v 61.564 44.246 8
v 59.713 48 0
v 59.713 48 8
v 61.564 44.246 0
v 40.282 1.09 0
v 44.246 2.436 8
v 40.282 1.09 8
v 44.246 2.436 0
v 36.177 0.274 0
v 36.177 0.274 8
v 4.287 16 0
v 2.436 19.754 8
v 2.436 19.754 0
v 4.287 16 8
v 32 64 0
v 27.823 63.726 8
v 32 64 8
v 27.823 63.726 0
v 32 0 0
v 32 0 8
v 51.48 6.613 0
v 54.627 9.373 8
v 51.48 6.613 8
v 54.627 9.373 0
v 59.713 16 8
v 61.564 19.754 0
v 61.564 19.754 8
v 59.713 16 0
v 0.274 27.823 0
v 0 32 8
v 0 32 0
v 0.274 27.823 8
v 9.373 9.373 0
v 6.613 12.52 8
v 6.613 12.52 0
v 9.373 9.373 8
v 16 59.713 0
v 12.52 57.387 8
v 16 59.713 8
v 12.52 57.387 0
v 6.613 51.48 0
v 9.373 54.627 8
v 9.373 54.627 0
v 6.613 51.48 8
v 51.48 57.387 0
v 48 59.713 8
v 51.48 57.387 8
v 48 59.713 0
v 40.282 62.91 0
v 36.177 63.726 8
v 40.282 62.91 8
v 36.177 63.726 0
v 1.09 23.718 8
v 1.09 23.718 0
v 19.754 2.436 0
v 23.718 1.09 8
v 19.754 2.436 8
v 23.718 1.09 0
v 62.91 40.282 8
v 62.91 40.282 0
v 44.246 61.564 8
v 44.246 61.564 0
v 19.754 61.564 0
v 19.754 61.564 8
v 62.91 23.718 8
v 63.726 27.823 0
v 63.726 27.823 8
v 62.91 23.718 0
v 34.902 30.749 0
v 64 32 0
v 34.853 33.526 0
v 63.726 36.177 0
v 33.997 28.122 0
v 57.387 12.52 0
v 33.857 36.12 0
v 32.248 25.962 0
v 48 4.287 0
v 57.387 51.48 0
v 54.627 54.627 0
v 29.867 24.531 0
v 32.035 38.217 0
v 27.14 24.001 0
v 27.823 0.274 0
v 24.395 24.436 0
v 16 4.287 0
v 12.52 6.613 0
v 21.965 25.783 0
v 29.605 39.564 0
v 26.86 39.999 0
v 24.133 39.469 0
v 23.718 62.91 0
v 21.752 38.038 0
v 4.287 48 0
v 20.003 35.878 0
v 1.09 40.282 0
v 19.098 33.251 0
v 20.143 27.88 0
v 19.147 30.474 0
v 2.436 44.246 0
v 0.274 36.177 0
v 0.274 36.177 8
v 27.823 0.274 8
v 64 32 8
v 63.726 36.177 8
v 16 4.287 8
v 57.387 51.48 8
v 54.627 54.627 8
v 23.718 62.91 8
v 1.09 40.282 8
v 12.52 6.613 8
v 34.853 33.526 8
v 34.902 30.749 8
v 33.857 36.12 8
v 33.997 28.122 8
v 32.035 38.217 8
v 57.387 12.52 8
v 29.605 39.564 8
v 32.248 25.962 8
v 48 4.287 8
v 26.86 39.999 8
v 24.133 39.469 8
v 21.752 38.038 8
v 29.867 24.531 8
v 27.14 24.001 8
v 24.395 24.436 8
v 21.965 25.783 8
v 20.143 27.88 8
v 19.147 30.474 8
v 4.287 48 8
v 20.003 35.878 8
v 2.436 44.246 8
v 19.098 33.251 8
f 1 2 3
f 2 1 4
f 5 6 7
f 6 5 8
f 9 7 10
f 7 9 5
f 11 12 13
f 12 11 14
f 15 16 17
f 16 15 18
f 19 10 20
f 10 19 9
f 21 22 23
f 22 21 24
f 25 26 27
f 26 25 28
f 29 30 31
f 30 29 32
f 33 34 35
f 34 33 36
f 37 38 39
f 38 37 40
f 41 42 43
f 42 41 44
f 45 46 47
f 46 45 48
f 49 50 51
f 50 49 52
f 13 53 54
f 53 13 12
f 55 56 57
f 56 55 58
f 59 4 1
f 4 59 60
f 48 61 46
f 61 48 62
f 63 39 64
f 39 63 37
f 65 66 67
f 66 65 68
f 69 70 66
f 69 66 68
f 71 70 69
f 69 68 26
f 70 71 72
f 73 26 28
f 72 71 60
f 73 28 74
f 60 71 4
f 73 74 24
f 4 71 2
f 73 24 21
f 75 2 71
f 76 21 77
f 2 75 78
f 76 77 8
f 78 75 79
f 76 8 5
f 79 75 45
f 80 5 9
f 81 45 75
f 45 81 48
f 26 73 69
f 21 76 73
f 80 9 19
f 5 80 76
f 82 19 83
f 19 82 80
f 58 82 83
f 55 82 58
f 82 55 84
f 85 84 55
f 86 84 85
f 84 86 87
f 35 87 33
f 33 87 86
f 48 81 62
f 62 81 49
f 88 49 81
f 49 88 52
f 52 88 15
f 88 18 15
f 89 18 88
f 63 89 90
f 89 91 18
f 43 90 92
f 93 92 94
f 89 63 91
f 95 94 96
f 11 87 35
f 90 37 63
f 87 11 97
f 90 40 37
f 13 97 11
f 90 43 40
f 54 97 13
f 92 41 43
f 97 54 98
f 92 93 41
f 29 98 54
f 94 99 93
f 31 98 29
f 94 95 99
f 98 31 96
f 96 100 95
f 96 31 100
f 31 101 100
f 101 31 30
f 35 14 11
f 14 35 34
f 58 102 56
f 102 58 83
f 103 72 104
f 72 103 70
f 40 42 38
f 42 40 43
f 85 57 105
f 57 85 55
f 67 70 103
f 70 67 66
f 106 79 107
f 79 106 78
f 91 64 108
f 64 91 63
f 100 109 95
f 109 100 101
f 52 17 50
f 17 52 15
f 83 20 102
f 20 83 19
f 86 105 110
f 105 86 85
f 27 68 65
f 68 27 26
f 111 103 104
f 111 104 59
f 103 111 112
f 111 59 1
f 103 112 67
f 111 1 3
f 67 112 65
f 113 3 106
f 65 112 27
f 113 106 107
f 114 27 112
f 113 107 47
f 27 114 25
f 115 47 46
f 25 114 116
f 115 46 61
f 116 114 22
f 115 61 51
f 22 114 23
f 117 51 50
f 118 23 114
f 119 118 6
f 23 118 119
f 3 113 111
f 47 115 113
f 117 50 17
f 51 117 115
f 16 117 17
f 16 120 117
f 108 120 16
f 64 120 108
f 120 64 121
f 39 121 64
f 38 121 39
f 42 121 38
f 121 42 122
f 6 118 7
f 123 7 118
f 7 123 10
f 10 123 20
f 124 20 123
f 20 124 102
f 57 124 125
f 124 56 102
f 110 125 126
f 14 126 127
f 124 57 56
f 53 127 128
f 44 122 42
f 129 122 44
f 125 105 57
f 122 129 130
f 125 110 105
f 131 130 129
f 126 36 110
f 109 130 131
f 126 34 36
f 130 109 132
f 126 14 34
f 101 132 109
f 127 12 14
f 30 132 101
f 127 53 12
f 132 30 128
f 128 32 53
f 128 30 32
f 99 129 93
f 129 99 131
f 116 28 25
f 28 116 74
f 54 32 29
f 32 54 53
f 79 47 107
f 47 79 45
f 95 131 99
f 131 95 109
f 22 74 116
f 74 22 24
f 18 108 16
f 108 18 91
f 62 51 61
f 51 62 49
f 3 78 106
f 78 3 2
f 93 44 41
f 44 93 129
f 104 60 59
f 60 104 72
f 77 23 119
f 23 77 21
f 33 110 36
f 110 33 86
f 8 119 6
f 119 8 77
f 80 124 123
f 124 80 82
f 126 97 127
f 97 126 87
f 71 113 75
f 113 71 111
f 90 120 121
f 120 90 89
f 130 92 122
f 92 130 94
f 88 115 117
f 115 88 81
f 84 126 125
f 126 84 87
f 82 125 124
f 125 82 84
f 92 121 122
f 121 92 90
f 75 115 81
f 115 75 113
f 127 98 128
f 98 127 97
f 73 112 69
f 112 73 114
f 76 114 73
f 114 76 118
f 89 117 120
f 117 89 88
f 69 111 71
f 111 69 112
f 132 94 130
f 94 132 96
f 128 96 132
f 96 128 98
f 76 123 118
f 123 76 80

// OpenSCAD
$fn = 32;

// ----------------------------------------------------------------------
// Cam plate: eccentric cam, base R32
// ----------------------------------------------------------------------

// --- parameters (mm) ---
base_r = 32;              // base circle radius
lobe_h = 8;               // cam lobe rise
bore_r = 8;               // shaft bore radius
plate_t = 8;              // plate thickness, Z (extrusion height)
ecc = 5;                  // disc eccentricity

profile = [[64, 32], [63.726, 36.177], [62.91, 40.282], [61.564, 44.246], [59.713, 48], [57.387, 51.48], [54.627, 54.627], [51.48, 57.387], [48, 59.713], [44.246, 61.564], [40.282, 62.91], [36.177, 63.726], [32, 64], [27.823, 63.726], [23.718, 62.91], [19.754, 61.564], [16, 59.713], [12.52, 57.387], [9.373, 54.627], [6.613, 51.48], [4.287, 48], [2.436, 44.246], [1.09, 40.282], [0.274, 36.177], [0, 32], [0.274, 27.823], [1.09, 23.718], [2.436, 19.754], [4.287, 16], [6.613, 12.52], [9.373, 9.373], [12.52, 6.613], [16, 4.287], [19.754, 2.436], [23.718, 1.09], [27.823, 0.274], [32, 0], [36.177, 0.274], [40.282, 1.09], [44.246, 2.436], [48, 4.287], [51.48, 6.613], [54.627, 9.373], [57.387, 12.52], [59.713, 16], [61.564, 19.754], [62.91, 23.718], [63.726, 27.823]];  // primary outline, 48 points, counter clockwise
void_1 = [[34.853, 33.526], [33.857, 36.12], [32.035, 38.217], [29.605, 39.564], [26.86, 39.999], [24.133, 39.469], [21.752, 38.038], [20.003, 35.878], [19.098, 33.251], [19.147, 30.474], [20.143, 27.88], [21.965, 25.783], [24.395, 24.436], [27.14, 24.001], [29.867, 24.531], [32.248, 25.962], [33.997, 28.122], [34.902, 30.749]];  // shaft bore, 18 points

// --- the one profile operation ---
difference() {
  linear_extrude(height = plate_t) polygon(points = profile);
  translate([0, 0, -1])
    linear_extrude(height = plate_t + 2) polygon(points = void_1);
}
